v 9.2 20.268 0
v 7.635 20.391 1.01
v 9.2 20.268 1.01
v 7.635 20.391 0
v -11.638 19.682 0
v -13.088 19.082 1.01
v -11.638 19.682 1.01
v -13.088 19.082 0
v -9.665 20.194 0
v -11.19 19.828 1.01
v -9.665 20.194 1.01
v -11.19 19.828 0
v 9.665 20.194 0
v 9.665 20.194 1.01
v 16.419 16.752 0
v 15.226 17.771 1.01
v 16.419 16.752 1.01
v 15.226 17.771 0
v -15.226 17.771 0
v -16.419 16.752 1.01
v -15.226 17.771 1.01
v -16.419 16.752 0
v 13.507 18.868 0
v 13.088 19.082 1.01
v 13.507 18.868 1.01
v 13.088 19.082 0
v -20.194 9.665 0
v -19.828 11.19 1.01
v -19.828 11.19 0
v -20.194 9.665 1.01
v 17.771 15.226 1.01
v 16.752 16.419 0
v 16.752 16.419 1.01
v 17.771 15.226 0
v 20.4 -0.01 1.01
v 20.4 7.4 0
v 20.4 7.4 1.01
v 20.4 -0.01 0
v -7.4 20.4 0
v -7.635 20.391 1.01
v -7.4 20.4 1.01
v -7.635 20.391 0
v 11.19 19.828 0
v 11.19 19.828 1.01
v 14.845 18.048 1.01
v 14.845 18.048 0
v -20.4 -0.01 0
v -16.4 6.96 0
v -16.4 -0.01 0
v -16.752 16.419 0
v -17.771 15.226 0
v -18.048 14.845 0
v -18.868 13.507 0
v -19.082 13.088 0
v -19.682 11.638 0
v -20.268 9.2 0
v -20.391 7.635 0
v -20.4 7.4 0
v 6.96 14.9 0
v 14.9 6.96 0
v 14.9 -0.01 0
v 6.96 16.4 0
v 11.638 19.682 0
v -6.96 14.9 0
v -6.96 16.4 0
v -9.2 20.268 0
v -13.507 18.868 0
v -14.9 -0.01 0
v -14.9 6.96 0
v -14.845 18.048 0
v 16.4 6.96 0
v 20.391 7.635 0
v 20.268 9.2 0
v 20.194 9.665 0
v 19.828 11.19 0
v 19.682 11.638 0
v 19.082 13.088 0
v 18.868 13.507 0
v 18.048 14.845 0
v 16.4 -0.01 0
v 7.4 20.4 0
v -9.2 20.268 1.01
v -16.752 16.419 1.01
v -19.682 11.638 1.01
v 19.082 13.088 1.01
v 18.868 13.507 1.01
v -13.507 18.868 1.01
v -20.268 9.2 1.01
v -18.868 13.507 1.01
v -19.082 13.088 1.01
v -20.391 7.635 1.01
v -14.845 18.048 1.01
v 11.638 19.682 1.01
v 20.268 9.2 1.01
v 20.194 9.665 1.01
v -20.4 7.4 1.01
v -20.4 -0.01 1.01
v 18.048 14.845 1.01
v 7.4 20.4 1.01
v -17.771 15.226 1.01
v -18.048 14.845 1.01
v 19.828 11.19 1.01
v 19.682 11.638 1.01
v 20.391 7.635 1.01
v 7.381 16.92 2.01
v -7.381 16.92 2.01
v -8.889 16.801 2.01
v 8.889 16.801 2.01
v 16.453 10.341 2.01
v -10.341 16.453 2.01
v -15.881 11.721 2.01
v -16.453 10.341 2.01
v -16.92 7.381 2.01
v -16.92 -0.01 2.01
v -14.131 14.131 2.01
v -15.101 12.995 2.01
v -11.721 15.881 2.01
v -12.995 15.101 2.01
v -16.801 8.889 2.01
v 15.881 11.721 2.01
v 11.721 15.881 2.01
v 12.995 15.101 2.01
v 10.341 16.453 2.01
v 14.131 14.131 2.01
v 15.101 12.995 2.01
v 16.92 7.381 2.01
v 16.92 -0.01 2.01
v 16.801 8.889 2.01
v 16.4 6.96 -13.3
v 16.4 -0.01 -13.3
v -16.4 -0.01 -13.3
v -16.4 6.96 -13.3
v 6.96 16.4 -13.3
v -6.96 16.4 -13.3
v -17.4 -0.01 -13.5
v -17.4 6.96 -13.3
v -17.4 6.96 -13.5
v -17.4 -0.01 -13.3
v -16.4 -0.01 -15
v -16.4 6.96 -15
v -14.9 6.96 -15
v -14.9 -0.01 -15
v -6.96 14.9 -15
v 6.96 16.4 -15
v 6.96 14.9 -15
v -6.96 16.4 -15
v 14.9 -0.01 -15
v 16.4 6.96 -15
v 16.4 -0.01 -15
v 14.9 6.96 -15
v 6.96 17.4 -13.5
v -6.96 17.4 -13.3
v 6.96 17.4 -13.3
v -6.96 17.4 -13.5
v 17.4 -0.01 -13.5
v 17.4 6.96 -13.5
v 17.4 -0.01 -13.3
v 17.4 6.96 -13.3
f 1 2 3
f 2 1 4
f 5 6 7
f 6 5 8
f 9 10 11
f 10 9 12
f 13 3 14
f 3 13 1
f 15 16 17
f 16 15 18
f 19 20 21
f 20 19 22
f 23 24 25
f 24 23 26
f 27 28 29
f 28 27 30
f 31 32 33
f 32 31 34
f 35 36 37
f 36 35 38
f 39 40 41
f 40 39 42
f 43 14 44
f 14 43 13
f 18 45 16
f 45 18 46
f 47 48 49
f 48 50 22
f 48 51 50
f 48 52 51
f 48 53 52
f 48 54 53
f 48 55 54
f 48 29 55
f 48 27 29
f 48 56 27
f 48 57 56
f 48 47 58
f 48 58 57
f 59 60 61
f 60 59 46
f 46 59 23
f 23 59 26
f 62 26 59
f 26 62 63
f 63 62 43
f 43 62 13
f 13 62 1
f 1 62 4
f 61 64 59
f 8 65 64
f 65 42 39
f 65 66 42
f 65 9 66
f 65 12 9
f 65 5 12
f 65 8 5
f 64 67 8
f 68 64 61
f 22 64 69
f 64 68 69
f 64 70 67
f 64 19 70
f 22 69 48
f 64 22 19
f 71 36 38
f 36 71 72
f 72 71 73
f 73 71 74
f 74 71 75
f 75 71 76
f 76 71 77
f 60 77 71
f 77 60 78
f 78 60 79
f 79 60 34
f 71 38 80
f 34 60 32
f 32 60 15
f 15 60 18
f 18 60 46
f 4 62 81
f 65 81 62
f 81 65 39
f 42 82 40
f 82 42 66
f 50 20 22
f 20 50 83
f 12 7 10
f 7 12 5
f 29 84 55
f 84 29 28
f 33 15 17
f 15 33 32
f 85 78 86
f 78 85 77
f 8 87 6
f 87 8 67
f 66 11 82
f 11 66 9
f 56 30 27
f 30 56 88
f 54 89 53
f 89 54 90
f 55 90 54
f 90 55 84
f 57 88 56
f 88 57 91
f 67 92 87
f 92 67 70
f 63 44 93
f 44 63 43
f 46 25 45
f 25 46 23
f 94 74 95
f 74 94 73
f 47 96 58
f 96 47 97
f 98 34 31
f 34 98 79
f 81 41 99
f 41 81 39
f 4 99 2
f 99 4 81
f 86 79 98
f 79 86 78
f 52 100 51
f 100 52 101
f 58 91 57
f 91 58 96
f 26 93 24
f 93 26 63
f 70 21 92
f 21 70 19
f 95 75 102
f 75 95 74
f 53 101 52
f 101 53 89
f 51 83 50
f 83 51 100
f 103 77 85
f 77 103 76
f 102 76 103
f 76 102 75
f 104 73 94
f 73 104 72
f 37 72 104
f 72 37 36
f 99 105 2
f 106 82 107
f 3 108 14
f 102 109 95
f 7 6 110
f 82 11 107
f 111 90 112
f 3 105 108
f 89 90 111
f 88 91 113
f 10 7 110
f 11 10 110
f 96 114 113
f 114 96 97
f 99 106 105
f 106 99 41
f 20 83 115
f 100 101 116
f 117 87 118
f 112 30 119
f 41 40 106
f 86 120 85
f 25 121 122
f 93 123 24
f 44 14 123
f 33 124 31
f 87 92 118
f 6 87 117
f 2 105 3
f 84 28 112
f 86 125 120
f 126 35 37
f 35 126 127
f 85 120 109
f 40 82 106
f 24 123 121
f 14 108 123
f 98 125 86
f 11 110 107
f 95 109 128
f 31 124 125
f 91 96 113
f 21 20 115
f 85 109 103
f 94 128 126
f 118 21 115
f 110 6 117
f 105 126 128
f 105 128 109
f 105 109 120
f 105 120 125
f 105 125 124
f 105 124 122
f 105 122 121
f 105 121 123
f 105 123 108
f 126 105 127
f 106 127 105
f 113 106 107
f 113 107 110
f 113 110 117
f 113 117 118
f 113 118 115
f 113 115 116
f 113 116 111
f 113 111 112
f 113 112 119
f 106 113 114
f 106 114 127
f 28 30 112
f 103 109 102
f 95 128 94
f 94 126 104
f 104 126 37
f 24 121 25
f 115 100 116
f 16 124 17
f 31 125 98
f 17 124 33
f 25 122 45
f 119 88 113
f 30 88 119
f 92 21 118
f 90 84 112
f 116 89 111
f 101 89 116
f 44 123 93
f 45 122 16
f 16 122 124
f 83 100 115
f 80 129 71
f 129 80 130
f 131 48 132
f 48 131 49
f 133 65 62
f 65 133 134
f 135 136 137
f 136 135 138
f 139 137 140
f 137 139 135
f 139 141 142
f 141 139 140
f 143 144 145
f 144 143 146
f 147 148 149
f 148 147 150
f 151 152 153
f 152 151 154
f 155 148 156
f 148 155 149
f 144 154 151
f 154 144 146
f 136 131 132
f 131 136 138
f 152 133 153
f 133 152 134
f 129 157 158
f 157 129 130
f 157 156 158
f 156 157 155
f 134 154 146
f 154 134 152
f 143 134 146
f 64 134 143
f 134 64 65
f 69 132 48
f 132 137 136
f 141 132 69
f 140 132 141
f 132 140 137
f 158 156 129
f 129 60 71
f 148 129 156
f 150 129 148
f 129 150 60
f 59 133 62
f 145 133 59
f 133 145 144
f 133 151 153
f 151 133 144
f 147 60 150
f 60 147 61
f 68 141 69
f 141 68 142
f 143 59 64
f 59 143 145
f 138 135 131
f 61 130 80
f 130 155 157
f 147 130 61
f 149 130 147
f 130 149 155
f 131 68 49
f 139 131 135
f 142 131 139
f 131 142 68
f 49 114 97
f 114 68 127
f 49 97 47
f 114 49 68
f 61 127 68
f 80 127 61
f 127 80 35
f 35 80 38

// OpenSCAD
/*----------------------------------------------------------------------------*/
/* Cap Generator
/* by Ziv Botzer
/*----------------------------------------------------------------------------*/

// Turn on for validation during preview, TURN OFF FOR PRODUCTION
show_slice = "On"; // [On, Off]

// Hole shape
hole_shape = "Square"; // [Round, Square, Rectangle]

// HOLE Dimension 1 (if circular = diameter)
hole_dimension1 = 34.8; // [10:0.1:150]

// HOLE Dimension 2 (only for rectangle shape)
hole_dimension2 = 50; // [10:0.1:150]

// HOLE Corner Radius (for square/rectangle shapes)
hole_radius = 10; // [0:0.1:20]

// HOLE Depth (e.g. for a table, thickness of the board)
hole_depth = 20; // [2:0.1:100]


// PLUG: plug length
plug_length = 15; // [2:0.1:100]

// PLUG: plug clearance inside hole
plug_clearance = 1; // [0:0.1:5]

// PLUG: plug material thickness
plug_thickness = 1.5; // [0.5:0.1:5]

// PLUG: Choose if you like snaps or fins
features = "Snaps"; // [Snaps, Fins, None]

// PLUG: Snaps/Fins protrusion of teeth (mm)
feature_length = 1.0; // [0.1:0.1:6]

// PLUG: Snaps/Fins height of teeth (mm)
feature_height = 1.5; // [0.1:0.1:6]

// PLUG FINS: Number of fins
fin_number = 3; // [1:1:6]

// PLUG SNAPS: Determines gaps size between snaps
snap_width_factor = 0.5; // [0.1:0.1:1]


// COVER: thickness (mm)
cover_thickness = 2; // [0.5:0.1:15]

// COVER: Overlap around hole
cover_offset = 3; // [0:0.1:30]

// COVER: Edge design
cover_edge = "Chamfer"; // [Chamfer, Round]

// COVER: Edge design ratio 1 (relative size of chamfer/fillet)
cover_edge_ratioV = 0.5; // [0:0.1:1]

// COVER: Edge design ratio 2 (relative size of chamfer/fillet)
cover_edge_ratioH = 0.1; // [0:0.1:1]

// QUALITY: number of polygon facets
$fn = 40;

// QUALITY: steps in fillet cover design 
fillet_steps = 6; // [4:1:15]


/* [Hidden] */
clearance = 0.01;
show_slice_ = (show_slice=="On");
snaps = features == "Snaps";
fins = features == "Fins";

/* testing area
hole_shape = "Rectangle"; // [Round, Square, Rectangle]
snap_width_factor = .5; // [0.1:0.1:1]
show_slice = "Off"; // [On, Off]
features = "Fins"; // [Snaps, Fins, None]
fin_number = 3; // [1:1:6]
hole_radius = 1; // [0:0.1:20]
*/

/*****************************************/
// Show hole

larger_dim = ((hole_shape=="Rectangle")?max(hole_dimension1, hole_dimension2) : hole_dimension1) + cover_offset;
smaller_dim = (hole_shape=="Rectangle")?min(hole_dimension1, hole_dimension2) : hole_dimension1;
largest_depth = max(hole_depth, plug_length)+cover_thickness+1;

// can't have corner radius exceed half the facet length
hole_radius_safe = (hole_radius > smaller_dim/2) ? (smaller_dim/2 - clearance) : hole_radius;

// Illustrate the piece needing a cover
if (show_slice_)
%difference() {
    translate([0,0,-hole_depth/2])
    cube([larger_dim*1.5,larger_dim*1.5,hole_depth],center=true);
    
    translate([0,0,-(hole_depth+clearance)])
    linear_extrude(hole_depth+4*clearance)
    gen_hole_shape(hole_dimension1, hole_dimension2, hole_radius_safe);

    if (show_slice_)
        translate([0,-larger_dim/2, -(largest_depth/2-clearance)])
        cube([larger_dim*2.2, larger_dim*1, largest_depth+clearance*4], center=true);
}

// Generate the cap
difference() {
    generate_cap();
    
    color("Red")
    if (show_slice_)
        translate([0,-larger_dim/2-0.01, -(largest_depth/2)])
        cube([larger_dim*1.8, larger_dim*1, largest_depth*2], center=true);
}




//********************** FUNCTIONS *****************************

module generate_cap () {
    
    union() {
        // Generate cover with corner design
        if (cover_edge == "Chamfer") {
            linear_extrude((1-cover_edge_ratioV)*cover_thickness + clearance, convexity = 4)
            offset(r=cover_offset)
                gen_hole_shape(hole_dimension1, hole_dimension2, hole_radius_safe);
            
            hull() {
                translate([0,0,(1-cover_edge_ratioV)*cover_thickness])
                for (i = [0,1]) {
                    translate([0,0,i*cover_edge_ratioV*cover_thickness])
                    linear_extrude(0.01)
                    offset(r=cover_offset-i*cover_edge_ratioH*smaller_dim)
                    gen_hole_shape(hole_dimension1, hole_dimension2, hole_radius_safe);
                }
            }
            
         
        }
        else if (cover_edge == "Round") {
            linear_extrude((1-cover_edge_ratioV)*cover_thickness + clearance, convexity = 4)
            offset(r=cover_offset)
                gen_hole_shape(hole_dimension1, hole_dimension2, hole_radius_safe);
            
            hull() {
                translate([0,0,(1-cover_edge_ratioV)*cover_thickness])
                for (i = [0:1/fillet_steps:1]) {
                    translate([0,0, sin(i*90)*cover_edge_ratioV*cover_thickness])
                    linear_extrude(0.01)
                    offset(r=cover_offset - (1-cos(i*90))*cover_edge_ratioH*smaller_dim)
                    gen_hole_shape(hole_dimension1, hole_dimension2, hole_radius_safe);
                }
            }
        }
        
        // Generate plug
        difference() {
            
            union() {
                translate([0,0,-(plug_length) + clearance])
                linear_extrude(plug_length+clearance, convexity = 4)
                offset(r=-plug_clearance)
                gen_hole_shape(hole_dimension1, hole_dimension2, hole_radius_safe);

                
                // Generate plug fins
                //translate([0,0,-(hole_depth) + clearance])
                if (fins) {
                    d = plug_length/(fin_number+1);
                    for (i = [1:fin_number]) {
                        translate([0,0,-(d*i + 0.3*d)])
                        hull() {
                            linear_extrude(0.01)
                            offset(r=-plug_clearance)
                            gen_hole_shape(hole_dimension1, hole_dimension2, hole_radius_safe);
                            
                            translate([0,0,feature_height])
                            linear_extrude(0.2)
                            offset(r=feature_length-plug_clearance)
                            gen_hole_shape(hole_dimension1, hole_dimension2, hole_radius_safe);
                        }
                    }
                }
                
                if (snaps) {
                    translate([0,0,-plug_length])
                    hull() {
                        linear_extrude(0.01)
                        offset(r=-plug_clearance)
                        gen_hole_shape(hole_dimension1, hole_dimension2, hole_radius_safe);
                        
                        translate([0,0,feature_height])
                        linear_extrude(0.2)
                        offset(r=feature_length-plug_clearance)
                        gen_hole_shape(hole_dimension1, hole_dimension2, hole_radius_safe);
                    }

                }
            }
            
            // remove inner volume of plug
            translate([0,0,-(plug_length) - clearance])
            linear_extrude(plug_length+2*clearance, convexity = 4)
            offset(r=-(plug_clearance+plug_thickness))
            gen_hole_shape(hole_dimension1, hole_dimension2, hole_radius_safe);
            
            // remove edge chamfer
            if (!snaps)
            translate([0,0,-(plug_length) ])
            difference() {
                linear_extrude(plug_thickness/2 + clearance )
                offset(r=-plug_clearance  + clearance)
                gen_hole_shape(hole_dimension1, hole_dimension2, hole_radius_safe);
            
                hull() {
                    linear_extrude(0.01)
                    offset(r=-plug_clearance -(plug_thickness/2)  + 2*clearance)
                    gen_hole_shape(hole_dimension1, hole_dimension2, hole_radius_safe);
                    
                    translate([0,0,plug_thickness/2 + 2*clearance ])
                    linear_extrude(0.01)
                    offset(r=-plug_clearance)
                    gen_hole_shape(hole_dimension1, hole_dimension2, hole_radius_safe);
                }
            }
            
            // remove snap gaps
            if (snaps) {
                if (hole_shape == "Square") {
                    factor = 0.5+snap_width_factor*0.4;
                    rotate([0,0,45])
                    for (i = [1:4]) {
                        rotate([0,0,i*360/4])
                        translate([factor*hole_dimension1/sin(45),0,-(plug_length/2 + clearance)])
                        rotate([0,0,45])
                        cube([hole_dimension1,hole_dimension1,plug_length+4*clearance], center=true);
                    }
                    
                } 
                else if (hole_shape == "Round") {
                    factor = 0.48+snap_width_factor*0.3;
                    rotate([0,0,45])
                    for (i = [1:4]) {
                        rotate([0,0,i*360/4])
                        translate([factor*hole_dimension1/sin(45),0,-(plug_length/2 + clearance)])
                        rotate([0,0,45])
                        cube([hole_dimension1,hole_dimension1,plug_length+4*clearance], center=true);
                    }
                }
                else { // Rectangle
                    factor = 0.5+0.4*snap_width_factor;
                    
                    translate([-factor*hole_dimension1,factor*hole_dimension2,-(plug_length/2 + clearance)])
                    cube([hole_dimension1,hole_dimension2,plug_length+4*clearance], center=true);
                    
                    translate([factor*hole_dimension1,factor*hole_dimension2,-(plug_length/2 + clearance)])
                    cube([hole_dimension1,hole_dimension2,plug_length+4*clearance], center=true);
                    
                    translate([-factor*hole_dimension1,-factor*hole_dimension2,-(plug_length/2 + clearance)])
                    cube([hole_dimension1,hole_dimension2,plug_length+4*clearance], center=true);
                    
                    translate([factor*hole_dimension1,-factor*hole_dimension2,-(plug_length/2 + clearance)])
                    cube([hole_dimension1,hole_dimension2,plug_length+4*clearance], center=true);
                    
                }
                
            }
            
        }
    }
}

module gen_hole_shape ( d1, d2, r1 ) {
    if (hole_shape == "Round") {
        circle(d=d1);
    }
    else {
        d1b = d1 - 2*r1;
        d2b = ((hole_shape == "Square")?d1:d2) - 2*r1;
        
        translate([-d1b/2,-d2b/2,0]) {
            if (r1 > 0)
                minkowski() {
                    circle(r1);
                    square([d1b,d2b]);
                }
            else {
                square([d1b,d2b]);
            }
        }
    }
}
